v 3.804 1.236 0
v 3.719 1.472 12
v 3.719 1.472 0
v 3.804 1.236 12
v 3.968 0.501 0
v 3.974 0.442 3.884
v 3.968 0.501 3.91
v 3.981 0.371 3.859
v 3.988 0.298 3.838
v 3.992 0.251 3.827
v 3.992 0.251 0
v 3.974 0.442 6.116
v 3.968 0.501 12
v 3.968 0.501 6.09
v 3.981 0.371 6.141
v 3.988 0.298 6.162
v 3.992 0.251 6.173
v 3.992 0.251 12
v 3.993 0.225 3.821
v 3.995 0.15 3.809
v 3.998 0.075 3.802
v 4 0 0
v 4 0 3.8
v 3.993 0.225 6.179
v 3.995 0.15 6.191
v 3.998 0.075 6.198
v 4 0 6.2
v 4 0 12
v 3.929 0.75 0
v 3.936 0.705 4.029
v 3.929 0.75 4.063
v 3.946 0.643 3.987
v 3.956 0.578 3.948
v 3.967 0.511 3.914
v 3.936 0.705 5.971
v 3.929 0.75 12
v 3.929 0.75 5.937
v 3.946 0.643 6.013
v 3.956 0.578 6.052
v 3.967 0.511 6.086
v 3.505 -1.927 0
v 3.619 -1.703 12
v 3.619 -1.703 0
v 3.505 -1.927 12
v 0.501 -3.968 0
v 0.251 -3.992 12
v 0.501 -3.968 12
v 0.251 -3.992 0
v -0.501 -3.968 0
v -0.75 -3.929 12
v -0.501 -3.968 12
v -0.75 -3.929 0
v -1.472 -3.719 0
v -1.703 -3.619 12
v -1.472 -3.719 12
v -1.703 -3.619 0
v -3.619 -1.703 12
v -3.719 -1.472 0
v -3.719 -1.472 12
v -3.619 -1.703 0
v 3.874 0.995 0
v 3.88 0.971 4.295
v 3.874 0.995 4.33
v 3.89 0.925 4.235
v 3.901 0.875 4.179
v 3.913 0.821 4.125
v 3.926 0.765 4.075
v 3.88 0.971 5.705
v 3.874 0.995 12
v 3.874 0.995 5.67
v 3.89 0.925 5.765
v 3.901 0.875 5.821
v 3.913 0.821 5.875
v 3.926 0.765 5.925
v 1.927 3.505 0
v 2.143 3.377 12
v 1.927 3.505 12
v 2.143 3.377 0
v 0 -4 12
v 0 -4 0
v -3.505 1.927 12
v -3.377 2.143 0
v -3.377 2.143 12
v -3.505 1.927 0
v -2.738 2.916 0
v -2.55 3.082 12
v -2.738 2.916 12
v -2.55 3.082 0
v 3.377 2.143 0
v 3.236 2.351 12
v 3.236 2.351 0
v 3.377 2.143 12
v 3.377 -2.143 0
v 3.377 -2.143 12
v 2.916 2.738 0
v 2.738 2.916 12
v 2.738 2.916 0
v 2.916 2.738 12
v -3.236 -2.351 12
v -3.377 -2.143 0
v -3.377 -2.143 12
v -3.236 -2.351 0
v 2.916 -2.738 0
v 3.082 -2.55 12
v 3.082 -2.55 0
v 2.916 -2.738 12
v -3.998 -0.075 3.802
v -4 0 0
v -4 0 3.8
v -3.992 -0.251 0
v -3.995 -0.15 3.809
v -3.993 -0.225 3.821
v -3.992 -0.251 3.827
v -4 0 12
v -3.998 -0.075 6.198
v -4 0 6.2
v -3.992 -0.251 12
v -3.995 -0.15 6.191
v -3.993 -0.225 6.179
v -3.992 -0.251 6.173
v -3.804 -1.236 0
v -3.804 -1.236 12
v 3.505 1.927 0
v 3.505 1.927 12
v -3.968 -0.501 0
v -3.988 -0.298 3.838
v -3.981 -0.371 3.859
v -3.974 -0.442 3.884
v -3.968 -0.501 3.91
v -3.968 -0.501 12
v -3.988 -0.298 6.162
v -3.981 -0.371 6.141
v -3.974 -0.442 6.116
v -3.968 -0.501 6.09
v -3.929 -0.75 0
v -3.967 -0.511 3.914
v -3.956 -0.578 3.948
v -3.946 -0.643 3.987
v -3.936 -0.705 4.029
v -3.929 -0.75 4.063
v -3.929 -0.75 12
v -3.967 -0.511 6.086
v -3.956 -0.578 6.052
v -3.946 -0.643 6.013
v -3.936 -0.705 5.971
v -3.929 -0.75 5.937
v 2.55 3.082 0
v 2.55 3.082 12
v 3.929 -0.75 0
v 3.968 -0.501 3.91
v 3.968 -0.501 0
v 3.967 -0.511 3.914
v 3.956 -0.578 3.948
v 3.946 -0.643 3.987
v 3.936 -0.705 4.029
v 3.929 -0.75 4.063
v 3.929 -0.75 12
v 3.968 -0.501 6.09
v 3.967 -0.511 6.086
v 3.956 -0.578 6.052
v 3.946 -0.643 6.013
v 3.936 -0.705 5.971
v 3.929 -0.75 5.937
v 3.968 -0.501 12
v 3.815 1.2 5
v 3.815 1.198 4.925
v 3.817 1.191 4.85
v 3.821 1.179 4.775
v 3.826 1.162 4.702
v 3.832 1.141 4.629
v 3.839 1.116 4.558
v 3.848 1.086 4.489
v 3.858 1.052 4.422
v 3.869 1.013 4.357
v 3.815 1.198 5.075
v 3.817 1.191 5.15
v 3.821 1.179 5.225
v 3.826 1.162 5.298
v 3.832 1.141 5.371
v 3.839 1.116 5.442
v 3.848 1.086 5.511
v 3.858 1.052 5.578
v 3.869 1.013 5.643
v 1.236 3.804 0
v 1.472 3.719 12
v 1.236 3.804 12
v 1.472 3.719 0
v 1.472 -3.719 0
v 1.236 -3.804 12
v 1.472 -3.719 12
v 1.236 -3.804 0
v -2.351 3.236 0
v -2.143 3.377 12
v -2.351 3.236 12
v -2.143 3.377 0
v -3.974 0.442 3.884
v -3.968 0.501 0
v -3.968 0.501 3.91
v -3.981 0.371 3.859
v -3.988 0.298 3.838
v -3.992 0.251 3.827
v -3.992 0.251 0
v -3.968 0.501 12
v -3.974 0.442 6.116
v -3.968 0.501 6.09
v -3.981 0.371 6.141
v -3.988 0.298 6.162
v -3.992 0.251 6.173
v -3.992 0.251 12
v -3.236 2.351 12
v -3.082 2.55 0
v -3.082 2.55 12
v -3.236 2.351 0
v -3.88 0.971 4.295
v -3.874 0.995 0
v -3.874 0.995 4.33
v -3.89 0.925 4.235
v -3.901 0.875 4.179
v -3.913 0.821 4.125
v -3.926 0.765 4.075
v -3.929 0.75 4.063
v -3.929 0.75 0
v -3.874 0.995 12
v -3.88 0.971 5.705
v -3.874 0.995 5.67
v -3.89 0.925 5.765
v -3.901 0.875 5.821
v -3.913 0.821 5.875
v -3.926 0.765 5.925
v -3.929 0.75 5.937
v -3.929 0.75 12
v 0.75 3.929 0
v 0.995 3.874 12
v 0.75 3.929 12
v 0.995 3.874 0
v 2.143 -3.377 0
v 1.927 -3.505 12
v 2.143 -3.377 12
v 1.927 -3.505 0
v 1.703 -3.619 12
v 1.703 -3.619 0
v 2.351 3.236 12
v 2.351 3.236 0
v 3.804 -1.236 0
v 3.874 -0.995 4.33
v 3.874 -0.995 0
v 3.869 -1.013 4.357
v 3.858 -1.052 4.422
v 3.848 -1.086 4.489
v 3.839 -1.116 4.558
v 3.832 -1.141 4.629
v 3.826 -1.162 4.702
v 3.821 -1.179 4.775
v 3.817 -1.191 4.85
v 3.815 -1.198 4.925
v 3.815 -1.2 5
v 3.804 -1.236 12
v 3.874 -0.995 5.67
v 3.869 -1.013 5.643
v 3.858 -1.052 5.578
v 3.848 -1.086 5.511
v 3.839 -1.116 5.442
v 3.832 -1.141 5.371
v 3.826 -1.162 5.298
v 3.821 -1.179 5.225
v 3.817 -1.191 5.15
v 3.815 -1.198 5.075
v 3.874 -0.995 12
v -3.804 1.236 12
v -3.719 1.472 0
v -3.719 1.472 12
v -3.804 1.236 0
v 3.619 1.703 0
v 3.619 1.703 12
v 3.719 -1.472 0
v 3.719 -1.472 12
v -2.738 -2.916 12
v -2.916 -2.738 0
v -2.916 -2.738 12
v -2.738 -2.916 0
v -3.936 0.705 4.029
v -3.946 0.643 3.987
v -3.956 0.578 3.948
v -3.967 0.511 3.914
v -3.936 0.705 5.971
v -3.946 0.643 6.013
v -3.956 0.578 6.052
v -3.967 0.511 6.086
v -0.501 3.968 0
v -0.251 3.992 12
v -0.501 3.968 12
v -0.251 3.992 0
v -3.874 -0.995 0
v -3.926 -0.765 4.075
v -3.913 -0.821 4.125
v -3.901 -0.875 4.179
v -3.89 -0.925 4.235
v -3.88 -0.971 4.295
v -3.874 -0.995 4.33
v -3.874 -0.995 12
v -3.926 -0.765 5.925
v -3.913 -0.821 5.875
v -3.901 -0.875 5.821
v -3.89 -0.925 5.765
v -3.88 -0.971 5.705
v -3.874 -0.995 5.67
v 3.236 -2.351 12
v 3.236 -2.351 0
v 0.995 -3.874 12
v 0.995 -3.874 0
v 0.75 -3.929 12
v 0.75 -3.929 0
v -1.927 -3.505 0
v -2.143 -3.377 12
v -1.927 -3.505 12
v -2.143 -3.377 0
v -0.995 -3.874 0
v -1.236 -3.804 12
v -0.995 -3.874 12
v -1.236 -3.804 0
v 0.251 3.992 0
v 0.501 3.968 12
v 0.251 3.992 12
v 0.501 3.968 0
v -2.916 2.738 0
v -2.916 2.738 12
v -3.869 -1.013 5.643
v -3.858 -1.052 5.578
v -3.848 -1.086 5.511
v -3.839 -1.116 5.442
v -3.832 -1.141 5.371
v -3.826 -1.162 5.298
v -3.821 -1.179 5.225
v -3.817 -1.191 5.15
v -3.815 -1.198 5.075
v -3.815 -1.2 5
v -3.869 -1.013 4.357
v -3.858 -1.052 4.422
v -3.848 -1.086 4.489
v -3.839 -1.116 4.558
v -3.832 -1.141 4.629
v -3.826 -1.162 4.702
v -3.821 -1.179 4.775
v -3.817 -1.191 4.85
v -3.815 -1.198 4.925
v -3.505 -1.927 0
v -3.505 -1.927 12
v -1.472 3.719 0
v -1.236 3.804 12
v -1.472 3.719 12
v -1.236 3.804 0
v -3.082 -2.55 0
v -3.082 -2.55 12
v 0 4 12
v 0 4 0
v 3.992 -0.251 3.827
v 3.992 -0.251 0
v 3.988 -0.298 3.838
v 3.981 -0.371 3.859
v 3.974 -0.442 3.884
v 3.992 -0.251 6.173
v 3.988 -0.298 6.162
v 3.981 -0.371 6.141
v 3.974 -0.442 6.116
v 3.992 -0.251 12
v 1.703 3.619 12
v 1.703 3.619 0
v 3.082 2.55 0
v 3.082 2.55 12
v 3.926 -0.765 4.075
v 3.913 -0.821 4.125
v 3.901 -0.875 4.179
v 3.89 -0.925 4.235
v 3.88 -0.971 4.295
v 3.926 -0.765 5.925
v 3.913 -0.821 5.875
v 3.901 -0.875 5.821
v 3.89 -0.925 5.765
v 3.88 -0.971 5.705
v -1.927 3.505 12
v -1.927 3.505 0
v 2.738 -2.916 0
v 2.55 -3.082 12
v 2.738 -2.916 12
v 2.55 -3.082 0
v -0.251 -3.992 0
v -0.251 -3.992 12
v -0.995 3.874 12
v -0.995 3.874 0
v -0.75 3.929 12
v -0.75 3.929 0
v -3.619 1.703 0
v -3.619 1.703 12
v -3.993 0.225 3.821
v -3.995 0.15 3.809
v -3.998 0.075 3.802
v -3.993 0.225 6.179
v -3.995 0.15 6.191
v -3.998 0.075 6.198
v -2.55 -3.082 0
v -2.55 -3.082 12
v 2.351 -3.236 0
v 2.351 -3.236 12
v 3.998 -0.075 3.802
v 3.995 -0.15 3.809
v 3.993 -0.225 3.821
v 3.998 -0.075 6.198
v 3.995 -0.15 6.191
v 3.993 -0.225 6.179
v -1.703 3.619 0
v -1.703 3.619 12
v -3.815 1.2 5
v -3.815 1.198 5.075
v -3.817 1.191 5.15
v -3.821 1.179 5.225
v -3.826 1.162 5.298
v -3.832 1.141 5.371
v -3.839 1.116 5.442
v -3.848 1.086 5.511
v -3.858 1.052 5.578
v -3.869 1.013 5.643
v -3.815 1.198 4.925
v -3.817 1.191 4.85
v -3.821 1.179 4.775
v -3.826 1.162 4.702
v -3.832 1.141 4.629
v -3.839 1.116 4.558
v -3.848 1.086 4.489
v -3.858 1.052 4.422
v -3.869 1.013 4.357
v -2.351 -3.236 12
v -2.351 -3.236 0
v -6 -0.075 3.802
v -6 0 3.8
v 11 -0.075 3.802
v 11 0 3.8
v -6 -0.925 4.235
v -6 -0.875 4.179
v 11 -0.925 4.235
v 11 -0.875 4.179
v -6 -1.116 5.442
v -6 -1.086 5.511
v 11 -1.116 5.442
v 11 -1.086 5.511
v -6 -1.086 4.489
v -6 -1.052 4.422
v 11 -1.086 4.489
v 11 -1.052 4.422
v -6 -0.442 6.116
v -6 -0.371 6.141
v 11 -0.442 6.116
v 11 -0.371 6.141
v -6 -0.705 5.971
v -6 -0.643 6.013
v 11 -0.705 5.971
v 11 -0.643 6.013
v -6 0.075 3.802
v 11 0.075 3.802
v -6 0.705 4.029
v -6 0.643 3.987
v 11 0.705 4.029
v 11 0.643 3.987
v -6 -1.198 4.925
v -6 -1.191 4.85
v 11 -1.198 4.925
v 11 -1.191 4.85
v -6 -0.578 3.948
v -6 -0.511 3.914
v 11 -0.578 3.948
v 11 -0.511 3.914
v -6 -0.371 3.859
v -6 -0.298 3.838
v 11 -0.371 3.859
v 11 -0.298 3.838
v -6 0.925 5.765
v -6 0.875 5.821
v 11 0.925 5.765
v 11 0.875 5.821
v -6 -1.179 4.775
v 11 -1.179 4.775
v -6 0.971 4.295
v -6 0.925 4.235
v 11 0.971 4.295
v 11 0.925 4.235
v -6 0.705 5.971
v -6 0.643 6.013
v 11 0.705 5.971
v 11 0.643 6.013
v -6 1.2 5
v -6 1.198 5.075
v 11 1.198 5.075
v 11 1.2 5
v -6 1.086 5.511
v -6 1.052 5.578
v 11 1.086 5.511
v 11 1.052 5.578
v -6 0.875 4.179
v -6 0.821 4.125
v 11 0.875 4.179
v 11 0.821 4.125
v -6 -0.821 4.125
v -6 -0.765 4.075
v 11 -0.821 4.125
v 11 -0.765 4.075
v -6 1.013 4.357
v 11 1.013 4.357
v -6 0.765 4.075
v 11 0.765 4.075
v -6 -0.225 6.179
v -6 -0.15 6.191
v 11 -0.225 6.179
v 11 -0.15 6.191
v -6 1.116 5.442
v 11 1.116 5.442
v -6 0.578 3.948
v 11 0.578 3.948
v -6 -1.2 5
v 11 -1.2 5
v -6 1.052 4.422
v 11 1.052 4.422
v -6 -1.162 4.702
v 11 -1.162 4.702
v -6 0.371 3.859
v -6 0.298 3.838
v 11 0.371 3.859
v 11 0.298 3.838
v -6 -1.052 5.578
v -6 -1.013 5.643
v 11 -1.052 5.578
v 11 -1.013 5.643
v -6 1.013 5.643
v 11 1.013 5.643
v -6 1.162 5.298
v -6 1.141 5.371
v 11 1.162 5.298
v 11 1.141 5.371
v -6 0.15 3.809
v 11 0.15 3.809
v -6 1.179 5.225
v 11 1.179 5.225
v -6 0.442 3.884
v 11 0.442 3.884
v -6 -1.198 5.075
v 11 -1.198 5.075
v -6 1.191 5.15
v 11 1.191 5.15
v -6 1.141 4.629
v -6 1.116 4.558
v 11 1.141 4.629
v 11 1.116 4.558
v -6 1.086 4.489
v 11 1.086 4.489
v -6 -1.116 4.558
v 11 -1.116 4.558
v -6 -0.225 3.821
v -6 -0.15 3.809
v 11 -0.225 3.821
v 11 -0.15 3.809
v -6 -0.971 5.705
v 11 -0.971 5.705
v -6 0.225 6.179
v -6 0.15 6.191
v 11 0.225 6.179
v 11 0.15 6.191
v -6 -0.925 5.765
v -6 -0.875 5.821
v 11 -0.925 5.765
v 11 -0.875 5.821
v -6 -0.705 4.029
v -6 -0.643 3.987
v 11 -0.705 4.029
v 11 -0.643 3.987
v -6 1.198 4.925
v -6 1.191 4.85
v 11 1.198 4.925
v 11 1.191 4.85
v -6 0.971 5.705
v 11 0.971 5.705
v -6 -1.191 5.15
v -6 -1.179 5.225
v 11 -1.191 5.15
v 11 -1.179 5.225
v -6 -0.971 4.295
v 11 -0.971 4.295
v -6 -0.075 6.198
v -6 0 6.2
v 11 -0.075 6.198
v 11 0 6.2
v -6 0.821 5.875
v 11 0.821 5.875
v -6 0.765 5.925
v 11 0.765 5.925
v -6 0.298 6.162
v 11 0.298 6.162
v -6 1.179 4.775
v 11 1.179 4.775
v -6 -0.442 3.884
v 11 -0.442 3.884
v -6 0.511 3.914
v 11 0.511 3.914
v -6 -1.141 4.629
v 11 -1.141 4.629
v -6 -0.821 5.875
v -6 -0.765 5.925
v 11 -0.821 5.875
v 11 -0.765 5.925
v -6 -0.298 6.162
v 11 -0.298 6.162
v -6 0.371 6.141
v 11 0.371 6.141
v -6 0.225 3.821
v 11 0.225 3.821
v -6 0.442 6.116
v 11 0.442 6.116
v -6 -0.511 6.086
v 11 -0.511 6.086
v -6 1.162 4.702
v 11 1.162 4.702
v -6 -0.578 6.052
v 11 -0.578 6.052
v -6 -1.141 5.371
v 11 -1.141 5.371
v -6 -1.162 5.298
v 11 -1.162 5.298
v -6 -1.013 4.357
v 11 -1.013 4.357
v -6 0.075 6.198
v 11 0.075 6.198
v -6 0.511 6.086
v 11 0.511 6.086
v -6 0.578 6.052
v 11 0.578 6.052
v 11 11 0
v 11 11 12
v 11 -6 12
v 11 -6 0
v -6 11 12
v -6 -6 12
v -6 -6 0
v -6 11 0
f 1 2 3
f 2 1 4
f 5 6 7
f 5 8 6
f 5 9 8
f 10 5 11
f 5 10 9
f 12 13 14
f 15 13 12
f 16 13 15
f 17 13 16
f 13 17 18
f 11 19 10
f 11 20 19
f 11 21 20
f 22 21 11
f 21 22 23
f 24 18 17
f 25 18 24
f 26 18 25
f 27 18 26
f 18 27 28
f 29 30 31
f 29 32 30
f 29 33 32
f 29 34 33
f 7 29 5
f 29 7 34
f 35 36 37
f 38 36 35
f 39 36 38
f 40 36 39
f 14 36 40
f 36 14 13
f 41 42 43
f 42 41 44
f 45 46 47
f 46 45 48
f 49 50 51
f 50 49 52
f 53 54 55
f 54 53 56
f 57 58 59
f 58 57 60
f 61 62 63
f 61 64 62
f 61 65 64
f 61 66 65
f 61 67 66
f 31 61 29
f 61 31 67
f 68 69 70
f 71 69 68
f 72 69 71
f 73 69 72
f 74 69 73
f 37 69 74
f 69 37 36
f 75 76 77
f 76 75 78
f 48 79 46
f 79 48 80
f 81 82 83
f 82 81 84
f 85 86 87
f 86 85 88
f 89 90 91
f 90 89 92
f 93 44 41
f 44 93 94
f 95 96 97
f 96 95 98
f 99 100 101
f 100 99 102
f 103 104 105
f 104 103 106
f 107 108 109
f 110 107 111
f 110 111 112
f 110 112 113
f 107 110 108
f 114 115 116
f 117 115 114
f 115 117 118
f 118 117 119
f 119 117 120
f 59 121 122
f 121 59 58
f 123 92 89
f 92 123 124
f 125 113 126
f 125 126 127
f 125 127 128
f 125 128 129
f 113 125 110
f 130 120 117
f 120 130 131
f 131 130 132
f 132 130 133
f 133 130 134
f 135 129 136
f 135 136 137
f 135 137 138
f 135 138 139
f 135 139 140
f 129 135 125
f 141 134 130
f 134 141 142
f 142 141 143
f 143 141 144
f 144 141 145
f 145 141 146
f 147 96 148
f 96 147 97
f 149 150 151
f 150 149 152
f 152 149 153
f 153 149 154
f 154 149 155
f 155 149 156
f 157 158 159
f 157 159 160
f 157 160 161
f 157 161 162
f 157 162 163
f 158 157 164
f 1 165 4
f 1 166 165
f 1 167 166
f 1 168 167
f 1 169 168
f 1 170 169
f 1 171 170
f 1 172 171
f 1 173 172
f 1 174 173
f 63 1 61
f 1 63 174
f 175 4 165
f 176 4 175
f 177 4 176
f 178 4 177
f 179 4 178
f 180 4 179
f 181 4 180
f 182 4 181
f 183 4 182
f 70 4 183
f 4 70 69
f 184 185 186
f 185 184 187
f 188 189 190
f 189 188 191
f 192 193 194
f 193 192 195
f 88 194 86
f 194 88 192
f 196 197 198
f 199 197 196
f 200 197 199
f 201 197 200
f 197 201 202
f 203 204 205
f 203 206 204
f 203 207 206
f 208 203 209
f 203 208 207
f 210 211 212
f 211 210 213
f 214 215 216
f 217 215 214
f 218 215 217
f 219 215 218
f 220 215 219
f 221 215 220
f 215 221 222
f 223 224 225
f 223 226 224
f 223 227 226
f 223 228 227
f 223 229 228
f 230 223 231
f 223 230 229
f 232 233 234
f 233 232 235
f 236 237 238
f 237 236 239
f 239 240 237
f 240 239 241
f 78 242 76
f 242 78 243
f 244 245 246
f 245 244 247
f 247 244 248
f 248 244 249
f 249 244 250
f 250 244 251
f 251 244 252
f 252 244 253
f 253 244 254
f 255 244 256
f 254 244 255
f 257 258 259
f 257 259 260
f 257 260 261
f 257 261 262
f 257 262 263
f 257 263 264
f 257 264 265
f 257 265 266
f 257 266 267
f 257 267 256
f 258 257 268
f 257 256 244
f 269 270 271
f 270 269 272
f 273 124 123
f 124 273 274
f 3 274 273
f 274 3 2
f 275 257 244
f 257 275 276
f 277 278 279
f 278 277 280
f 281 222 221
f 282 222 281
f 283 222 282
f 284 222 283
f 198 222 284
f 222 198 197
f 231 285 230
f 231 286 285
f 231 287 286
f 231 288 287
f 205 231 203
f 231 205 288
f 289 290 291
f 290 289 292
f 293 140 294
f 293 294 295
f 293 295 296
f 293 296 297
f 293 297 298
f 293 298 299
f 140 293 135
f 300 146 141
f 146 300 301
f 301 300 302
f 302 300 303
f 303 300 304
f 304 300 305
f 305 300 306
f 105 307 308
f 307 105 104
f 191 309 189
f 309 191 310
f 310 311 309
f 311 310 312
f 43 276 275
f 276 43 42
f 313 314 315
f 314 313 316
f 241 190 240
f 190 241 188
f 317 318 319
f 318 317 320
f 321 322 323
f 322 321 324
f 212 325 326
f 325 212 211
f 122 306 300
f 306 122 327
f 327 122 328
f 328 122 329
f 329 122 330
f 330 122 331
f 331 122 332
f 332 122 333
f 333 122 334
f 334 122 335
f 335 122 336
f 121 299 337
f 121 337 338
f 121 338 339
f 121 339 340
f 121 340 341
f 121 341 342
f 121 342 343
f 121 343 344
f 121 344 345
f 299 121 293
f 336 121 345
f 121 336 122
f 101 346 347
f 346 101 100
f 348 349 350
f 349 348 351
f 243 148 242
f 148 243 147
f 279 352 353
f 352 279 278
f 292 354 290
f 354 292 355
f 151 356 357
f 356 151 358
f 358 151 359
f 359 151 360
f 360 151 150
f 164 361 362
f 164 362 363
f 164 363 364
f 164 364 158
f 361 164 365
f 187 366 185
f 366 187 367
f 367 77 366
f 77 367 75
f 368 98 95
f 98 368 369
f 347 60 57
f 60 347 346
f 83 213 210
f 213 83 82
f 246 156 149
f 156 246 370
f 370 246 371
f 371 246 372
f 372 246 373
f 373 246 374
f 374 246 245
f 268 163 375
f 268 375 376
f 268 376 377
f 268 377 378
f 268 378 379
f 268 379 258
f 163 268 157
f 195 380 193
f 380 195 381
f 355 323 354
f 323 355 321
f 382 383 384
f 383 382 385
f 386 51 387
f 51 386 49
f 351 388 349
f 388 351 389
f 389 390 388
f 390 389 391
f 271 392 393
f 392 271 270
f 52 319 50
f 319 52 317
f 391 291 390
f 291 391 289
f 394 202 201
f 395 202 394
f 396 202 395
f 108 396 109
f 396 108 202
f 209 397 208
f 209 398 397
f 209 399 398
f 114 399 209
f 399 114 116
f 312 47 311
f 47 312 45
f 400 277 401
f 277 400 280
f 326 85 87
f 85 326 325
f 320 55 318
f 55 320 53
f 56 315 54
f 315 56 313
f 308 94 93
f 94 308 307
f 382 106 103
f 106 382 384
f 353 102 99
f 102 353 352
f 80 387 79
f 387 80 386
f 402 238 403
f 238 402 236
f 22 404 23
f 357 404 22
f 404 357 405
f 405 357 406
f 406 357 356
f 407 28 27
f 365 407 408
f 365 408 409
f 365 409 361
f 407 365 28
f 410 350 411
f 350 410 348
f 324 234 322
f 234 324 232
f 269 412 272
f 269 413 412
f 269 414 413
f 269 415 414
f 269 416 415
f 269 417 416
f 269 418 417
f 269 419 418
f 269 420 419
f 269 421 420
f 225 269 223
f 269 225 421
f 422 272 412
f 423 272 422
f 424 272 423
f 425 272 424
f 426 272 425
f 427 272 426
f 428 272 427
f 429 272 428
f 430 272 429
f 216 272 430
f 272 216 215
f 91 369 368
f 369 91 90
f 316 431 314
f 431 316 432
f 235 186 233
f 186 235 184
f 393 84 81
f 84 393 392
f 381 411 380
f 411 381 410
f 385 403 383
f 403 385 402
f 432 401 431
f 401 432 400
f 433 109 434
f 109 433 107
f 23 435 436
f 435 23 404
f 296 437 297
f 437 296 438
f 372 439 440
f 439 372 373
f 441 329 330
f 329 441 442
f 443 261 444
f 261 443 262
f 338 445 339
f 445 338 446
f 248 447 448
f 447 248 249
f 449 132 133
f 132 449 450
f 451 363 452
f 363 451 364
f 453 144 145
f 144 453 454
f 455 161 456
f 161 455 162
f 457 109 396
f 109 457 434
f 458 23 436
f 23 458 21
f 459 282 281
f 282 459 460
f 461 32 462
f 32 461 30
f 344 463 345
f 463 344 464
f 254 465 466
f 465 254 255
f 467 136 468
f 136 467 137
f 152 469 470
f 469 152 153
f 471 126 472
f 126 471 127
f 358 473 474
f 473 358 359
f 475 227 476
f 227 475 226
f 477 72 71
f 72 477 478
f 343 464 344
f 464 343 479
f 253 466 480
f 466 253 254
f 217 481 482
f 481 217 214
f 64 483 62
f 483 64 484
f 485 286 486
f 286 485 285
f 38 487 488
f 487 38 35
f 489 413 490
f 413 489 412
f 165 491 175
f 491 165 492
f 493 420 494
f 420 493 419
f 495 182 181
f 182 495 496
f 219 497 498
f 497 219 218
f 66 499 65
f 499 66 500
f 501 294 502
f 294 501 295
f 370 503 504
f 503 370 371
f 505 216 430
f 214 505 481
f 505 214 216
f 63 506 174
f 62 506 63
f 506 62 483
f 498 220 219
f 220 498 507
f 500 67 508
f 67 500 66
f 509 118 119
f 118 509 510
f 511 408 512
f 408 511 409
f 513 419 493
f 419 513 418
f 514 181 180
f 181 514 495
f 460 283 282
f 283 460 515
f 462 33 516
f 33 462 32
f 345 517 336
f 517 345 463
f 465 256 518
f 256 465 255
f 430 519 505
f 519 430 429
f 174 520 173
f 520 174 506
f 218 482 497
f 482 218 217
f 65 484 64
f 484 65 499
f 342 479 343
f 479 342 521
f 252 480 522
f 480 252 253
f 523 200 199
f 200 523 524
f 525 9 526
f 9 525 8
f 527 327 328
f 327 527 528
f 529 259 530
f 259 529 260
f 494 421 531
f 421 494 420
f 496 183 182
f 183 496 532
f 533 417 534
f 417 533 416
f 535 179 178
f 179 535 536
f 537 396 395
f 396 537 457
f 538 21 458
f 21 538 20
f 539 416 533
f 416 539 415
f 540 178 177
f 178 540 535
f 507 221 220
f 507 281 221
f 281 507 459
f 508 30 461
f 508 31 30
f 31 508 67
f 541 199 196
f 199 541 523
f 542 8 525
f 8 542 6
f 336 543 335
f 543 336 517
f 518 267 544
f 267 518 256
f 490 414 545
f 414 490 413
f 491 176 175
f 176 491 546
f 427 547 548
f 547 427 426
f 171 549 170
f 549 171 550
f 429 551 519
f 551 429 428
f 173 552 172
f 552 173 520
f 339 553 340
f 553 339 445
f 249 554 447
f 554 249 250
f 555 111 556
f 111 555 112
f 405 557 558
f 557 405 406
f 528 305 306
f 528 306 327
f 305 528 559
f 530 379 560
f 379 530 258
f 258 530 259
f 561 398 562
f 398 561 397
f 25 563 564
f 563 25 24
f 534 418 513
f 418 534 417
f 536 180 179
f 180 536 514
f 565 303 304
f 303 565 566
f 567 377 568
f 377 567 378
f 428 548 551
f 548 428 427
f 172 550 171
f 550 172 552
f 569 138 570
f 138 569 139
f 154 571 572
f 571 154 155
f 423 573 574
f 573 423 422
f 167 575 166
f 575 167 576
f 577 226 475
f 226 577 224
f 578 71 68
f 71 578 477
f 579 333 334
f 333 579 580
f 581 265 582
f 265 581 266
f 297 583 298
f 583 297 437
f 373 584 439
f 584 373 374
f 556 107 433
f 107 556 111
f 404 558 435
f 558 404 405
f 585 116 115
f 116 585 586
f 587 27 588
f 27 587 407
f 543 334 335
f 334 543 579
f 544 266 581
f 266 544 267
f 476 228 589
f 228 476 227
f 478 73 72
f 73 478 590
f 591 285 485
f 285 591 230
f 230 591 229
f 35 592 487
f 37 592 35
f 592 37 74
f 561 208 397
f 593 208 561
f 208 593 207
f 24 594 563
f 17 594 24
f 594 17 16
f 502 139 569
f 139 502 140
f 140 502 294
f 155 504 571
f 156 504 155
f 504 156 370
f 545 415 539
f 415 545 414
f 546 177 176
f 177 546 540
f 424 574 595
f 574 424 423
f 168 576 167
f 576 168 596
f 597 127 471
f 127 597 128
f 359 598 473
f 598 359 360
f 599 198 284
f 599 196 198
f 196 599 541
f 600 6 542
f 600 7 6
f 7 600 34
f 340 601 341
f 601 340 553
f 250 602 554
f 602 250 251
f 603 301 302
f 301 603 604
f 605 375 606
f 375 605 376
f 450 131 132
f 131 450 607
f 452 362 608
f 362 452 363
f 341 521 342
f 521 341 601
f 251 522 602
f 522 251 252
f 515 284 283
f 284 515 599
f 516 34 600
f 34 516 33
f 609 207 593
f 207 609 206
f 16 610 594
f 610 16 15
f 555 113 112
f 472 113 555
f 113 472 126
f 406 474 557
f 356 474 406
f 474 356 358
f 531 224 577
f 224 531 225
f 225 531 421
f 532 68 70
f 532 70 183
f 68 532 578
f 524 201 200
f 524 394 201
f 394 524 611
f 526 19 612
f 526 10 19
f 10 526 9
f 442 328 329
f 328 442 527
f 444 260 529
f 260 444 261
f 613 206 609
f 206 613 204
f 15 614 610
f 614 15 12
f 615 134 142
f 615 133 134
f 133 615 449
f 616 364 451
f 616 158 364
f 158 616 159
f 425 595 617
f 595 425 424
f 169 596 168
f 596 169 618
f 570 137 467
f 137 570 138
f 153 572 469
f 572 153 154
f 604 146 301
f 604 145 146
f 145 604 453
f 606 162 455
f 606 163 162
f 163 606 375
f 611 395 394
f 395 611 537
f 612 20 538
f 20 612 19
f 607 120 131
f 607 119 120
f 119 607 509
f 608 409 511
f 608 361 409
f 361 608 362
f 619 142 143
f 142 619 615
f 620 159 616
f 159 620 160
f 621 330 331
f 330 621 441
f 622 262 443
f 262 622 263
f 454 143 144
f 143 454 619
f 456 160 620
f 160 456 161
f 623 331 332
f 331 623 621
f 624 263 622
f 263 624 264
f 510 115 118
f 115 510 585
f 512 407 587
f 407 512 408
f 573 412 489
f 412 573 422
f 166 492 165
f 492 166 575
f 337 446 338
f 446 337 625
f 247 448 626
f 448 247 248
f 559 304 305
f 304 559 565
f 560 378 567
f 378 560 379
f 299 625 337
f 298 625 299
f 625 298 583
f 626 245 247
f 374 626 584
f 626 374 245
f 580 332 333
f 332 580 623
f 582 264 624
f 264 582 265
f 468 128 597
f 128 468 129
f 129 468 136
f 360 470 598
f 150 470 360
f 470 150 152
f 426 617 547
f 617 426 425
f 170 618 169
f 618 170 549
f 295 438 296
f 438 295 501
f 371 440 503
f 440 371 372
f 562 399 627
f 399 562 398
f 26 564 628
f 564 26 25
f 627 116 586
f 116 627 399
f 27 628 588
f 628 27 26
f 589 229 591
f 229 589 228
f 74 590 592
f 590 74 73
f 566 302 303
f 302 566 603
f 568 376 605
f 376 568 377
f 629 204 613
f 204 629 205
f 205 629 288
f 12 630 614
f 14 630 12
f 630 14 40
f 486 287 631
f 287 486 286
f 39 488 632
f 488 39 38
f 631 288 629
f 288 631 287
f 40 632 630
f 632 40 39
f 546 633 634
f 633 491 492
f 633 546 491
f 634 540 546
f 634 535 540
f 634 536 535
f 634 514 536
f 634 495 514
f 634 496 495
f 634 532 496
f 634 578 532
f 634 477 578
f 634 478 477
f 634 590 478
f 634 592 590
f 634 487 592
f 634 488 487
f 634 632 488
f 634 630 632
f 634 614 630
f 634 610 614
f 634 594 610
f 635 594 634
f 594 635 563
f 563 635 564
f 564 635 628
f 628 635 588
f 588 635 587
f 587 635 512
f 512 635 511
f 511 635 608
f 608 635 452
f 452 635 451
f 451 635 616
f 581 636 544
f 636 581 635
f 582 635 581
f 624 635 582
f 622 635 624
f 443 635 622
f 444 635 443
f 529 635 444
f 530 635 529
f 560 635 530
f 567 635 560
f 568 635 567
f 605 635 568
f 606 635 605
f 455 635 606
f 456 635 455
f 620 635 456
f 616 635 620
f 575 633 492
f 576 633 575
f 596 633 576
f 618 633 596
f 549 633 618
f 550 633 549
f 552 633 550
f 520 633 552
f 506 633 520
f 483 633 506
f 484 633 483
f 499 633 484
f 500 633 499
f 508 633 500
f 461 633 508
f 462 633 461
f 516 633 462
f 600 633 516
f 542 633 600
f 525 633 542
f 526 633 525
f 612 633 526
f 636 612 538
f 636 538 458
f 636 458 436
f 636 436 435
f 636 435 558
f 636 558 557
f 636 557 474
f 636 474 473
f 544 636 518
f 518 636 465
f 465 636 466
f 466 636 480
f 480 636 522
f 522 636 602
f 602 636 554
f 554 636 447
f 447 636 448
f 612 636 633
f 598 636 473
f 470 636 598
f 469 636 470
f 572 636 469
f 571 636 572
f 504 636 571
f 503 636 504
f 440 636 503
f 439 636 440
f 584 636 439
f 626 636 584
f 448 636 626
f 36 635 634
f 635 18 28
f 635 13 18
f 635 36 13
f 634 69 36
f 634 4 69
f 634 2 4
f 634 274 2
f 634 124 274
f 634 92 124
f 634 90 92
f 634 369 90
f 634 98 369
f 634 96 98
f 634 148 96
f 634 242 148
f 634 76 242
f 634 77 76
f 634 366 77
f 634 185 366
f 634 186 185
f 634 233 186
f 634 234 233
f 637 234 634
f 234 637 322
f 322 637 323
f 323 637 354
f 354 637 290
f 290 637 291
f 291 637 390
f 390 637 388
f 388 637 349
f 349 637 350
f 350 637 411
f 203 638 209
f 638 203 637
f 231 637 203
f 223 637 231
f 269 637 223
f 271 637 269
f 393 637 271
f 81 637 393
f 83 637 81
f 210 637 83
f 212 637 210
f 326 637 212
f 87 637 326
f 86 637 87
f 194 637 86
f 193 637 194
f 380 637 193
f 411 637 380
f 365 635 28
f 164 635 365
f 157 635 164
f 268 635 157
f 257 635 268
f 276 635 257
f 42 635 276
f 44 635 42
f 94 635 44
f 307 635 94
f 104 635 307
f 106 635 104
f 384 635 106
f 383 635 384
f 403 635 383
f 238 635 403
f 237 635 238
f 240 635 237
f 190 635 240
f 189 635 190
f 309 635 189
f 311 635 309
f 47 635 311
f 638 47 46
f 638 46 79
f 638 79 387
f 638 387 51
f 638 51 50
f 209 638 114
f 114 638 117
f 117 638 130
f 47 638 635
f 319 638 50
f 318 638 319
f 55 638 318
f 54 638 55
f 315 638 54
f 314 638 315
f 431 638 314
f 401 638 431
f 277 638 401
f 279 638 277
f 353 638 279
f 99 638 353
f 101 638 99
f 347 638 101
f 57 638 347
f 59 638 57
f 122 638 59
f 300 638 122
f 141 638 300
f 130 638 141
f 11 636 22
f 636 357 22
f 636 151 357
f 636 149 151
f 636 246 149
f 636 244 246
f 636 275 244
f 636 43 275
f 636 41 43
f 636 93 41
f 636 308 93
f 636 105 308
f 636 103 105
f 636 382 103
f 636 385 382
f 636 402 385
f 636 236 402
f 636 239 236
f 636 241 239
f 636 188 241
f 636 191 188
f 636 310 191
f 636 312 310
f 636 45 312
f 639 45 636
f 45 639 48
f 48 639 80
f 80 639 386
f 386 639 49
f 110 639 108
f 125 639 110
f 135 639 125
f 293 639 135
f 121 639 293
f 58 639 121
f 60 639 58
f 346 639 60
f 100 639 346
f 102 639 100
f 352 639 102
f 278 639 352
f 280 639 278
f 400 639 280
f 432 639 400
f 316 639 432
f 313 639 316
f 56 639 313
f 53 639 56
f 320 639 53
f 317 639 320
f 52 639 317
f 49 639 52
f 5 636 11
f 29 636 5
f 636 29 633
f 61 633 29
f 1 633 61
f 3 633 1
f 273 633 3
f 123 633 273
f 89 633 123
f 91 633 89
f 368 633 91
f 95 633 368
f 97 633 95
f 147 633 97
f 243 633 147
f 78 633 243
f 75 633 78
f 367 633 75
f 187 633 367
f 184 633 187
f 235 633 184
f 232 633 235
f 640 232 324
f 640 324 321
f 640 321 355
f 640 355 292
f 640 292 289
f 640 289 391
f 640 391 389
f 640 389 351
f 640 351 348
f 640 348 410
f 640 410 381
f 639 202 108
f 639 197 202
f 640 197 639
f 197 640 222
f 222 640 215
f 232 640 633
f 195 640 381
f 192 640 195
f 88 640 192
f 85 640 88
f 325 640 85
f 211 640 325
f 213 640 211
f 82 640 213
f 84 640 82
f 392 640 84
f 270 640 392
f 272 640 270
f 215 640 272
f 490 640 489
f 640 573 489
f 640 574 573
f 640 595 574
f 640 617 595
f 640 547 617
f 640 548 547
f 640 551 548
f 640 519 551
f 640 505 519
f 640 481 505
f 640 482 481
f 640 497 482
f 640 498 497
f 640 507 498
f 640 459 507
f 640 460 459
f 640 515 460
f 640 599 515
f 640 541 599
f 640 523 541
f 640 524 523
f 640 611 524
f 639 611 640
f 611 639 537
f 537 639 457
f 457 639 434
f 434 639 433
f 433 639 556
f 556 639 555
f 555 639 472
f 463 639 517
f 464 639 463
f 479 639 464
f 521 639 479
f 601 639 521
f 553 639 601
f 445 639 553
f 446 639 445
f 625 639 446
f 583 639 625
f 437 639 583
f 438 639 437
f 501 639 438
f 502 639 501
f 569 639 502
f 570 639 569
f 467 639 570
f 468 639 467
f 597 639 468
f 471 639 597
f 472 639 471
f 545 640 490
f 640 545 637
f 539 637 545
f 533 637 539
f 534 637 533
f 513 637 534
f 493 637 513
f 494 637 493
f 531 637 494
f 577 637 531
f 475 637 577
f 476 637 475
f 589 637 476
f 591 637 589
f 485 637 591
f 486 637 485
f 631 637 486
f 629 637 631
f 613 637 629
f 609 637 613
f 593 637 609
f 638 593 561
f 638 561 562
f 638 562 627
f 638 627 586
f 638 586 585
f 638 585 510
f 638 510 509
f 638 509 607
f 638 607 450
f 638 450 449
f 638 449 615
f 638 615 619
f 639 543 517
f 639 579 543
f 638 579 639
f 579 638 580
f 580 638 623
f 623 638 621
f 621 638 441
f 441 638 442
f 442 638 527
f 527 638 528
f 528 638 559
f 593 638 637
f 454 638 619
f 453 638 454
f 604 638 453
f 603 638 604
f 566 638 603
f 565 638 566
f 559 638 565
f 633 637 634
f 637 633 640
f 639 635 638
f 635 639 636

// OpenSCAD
difference(){
	union(){
        translate([-6,-6,0]){
            cube([17,17,12], center=false);
        }


	}
	union() {

        translate([0,0,-1]){
            rotate([0,0,0]){
                cylinder(h=14, r=4, $fn=100, center=false);
            }
        }
        translate([-30,0,5]){
            rotate([0,90,0]){
                cylinder(h=100, r=1.2, $fn=100, center=false);
            }
        }


	}
}
